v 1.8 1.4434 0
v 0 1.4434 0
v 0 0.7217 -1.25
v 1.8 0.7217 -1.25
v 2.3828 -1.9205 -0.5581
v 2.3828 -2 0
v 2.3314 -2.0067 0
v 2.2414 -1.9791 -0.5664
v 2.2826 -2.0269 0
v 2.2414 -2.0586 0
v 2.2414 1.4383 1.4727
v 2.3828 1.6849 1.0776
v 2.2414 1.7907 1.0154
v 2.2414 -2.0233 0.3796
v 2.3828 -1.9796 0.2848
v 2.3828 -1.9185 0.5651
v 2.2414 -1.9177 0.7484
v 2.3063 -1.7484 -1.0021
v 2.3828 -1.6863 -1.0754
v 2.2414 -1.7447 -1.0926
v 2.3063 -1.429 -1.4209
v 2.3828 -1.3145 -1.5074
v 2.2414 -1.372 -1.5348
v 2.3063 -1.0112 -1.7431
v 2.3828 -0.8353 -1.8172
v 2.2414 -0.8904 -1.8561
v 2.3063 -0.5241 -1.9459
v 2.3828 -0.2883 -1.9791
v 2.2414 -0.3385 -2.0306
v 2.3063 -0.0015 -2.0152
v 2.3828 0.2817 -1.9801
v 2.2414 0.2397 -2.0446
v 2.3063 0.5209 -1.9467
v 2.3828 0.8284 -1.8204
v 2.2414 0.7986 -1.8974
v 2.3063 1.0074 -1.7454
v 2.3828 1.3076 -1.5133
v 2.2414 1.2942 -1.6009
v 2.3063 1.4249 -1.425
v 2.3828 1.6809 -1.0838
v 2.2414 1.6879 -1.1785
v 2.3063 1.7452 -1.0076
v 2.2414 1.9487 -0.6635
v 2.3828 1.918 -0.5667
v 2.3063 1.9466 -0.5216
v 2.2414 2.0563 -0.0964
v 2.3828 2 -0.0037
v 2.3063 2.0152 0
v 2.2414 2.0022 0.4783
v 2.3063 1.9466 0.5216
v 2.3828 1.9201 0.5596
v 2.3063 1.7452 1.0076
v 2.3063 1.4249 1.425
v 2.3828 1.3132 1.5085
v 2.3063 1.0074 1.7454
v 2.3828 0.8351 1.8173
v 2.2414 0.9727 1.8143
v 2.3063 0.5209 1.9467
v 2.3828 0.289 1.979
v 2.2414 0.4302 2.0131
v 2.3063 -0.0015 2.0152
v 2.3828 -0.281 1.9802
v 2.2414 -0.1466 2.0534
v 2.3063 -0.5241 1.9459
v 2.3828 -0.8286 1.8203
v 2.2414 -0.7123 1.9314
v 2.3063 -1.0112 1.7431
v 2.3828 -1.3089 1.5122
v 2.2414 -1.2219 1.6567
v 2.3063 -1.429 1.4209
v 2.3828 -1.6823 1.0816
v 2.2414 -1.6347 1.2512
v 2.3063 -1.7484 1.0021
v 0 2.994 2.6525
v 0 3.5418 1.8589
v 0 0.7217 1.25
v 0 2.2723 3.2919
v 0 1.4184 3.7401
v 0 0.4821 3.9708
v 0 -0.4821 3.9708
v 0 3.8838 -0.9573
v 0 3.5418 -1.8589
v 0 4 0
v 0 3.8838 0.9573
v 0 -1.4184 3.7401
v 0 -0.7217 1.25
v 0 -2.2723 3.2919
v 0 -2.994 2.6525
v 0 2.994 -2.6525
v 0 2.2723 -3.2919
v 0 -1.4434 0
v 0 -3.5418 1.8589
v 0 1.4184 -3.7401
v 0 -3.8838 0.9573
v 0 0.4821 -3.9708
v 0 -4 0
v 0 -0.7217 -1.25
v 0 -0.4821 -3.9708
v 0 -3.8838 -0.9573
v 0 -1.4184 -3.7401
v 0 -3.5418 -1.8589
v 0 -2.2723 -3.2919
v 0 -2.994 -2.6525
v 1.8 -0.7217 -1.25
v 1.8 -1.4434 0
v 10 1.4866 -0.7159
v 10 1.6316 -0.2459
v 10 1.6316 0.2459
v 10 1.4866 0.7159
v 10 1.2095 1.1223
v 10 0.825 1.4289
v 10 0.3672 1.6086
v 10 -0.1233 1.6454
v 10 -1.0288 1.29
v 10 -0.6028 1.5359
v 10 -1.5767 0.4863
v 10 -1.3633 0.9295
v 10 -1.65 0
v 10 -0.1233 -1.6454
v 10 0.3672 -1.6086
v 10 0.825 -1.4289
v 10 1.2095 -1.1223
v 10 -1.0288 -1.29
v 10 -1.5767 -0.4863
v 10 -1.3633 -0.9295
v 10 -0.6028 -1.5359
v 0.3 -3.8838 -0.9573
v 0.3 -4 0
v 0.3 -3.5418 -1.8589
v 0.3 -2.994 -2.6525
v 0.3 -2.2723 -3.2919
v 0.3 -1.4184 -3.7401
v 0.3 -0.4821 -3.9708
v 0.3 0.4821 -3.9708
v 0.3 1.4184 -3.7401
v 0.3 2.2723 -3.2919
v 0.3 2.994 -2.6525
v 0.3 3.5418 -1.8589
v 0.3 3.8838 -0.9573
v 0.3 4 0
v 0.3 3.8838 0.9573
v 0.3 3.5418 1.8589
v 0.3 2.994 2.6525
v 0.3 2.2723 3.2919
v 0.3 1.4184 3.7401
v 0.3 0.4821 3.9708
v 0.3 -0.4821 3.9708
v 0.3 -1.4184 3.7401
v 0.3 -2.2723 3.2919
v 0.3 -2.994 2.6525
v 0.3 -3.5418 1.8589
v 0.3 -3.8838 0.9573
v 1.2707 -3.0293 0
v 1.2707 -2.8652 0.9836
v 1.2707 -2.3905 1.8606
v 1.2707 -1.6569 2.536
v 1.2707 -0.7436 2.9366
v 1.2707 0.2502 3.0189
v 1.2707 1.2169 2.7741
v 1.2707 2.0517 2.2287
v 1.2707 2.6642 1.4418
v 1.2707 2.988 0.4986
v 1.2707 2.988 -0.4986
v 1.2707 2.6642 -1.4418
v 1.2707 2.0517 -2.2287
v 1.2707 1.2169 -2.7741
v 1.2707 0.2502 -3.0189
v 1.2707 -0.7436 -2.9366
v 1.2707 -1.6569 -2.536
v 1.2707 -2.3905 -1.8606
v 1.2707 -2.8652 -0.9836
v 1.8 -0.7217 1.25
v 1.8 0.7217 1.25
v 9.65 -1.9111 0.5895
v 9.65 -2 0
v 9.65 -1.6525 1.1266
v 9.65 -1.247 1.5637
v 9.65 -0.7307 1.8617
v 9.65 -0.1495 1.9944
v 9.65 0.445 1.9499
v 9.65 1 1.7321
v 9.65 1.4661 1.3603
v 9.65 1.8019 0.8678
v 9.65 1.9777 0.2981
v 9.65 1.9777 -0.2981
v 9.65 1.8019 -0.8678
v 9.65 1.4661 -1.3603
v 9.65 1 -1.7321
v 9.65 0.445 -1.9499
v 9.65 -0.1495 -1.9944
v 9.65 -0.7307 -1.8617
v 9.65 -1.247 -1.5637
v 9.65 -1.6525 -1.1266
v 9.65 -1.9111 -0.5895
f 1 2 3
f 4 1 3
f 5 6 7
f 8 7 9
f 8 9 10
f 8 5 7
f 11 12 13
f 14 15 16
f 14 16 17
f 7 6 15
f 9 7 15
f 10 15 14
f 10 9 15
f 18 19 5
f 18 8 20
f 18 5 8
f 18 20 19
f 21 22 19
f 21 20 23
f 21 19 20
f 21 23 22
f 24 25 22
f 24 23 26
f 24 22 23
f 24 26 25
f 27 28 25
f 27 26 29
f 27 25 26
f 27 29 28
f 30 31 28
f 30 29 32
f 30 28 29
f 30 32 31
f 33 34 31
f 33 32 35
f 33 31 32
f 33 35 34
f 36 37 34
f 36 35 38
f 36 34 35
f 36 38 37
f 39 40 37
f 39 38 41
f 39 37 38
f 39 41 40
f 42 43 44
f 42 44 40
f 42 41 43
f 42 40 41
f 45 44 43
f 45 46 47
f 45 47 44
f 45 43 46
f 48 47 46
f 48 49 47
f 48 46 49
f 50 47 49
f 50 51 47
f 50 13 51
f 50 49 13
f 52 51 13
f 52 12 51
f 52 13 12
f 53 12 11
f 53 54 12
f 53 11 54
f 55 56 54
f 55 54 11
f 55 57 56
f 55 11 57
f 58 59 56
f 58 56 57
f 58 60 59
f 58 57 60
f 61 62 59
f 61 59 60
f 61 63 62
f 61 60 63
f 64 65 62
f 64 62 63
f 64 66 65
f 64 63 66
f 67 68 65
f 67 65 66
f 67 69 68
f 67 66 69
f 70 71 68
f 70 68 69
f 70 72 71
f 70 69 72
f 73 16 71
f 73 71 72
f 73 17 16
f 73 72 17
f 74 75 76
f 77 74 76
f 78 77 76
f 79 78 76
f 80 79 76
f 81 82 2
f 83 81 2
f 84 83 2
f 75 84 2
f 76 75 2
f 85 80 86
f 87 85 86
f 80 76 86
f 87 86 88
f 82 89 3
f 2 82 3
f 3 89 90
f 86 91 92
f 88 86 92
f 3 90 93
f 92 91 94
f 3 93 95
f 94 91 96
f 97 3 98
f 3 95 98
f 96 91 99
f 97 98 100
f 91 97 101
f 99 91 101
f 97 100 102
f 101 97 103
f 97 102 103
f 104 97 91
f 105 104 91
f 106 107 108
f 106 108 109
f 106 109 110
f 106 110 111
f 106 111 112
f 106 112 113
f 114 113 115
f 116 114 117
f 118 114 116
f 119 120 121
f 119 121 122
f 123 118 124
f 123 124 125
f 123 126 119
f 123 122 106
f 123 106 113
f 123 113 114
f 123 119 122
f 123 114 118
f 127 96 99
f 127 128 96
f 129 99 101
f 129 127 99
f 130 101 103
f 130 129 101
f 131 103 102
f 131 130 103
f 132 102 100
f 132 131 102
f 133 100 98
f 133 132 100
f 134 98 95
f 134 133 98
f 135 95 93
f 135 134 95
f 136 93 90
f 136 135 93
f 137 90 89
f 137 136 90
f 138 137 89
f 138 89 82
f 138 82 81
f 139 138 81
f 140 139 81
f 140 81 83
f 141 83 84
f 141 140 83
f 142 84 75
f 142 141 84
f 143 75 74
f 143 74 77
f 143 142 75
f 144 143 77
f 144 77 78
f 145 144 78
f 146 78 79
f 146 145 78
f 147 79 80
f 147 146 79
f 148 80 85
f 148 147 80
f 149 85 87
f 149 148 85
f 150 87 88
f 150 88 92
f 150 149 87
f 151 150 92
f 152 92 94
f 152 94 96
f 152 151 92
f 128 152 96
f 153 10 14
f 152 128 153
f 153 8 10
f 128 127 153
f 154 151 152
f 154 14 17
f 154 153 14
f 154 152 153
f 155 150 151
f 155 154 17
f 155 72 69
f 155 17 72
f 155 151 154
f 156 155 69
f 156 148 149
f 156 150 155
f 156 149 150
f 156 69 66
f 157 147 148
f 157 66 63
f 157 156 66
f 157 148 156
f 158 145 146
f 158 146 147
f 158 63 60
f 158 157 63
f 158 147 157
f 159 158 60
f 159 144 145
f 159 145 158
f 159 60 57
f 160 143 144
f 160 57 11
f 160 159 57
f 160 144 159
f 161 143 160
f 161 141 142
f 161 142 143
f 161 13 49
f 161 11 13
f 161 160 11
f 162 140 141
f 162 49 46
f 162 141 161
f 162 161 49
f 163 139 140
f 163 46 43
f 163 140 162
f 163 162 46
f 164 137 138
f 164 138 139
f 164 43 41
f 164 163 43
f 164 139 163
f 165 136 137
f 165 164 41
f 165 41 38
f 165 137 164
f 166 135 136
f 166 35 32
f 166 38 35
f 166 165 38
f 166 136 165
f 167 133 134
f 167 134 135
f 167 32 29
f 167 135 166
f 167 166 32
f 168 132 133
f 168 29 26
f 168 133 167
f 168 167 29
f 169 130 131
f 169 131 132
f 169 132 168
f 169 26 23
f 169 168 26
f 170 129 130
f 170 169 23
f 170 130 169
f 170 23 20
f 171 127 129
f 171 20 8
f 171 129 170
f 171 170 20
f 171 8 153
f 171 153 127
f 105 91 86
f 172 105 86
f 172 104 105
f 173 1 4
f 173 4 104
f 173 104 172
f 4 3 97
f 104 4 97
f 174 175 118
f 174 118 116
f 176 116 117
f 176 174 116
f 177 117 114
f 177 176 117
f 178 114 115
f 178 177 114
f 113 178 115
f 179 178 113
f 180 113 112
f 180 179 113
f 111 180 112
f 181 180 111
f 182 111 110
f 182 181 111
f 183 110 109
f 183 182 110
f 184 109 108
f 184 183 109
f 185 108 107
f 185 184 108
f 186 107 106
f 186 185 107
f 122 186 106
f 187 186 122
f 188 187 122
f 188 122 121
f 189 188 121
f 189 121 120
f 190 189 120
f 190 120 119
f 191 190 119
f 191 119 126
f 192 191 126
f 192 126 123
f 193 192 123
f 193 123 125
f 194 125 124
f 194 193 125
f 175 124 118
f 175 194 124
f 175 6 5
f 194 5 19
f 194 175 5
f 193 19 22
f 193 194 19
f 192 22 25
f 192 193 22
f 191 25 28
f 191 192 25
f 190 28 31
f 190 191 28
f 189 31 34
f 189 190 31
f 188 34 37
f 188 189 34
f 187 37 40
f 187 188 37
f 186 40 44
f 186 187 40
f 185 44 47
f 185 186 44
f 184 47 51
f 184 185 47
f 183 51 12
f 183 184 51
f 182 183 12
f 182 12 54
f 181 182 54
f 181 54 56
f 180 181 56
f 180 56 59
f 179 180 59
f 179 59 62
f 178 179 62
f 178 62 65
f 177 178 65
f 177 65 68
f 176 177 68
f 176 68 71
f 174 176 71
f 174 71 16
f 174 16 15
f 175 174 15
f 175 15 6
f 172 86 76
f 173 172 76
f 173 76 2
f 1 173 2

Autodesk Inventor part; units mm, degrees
ref_plane "YZ Plane" through (0, 0, 0) normal (1, 0, 0) x (0, 1, 0)
sketch "Skizze1" plane through (0, 0, 0) normal (0, 1, 0) x (-1, 0, 0)
  point P0 (0, 0)
sketch "Skizze2" plane through (0, 0, 0) normal (0, 0, 1) x (-1, 0, 0)
  line L0 (-10, 2) -> (-10, 0)
  line L1 (-2.3, 2) -> (-10, 2)
  line L2 (-0.3, 4) -> (-2.3, 2)
  line L3 (0, 4) -> (-0.3, 4)
  line L4 (0, 0) -> (0, 4)
  line L5 (-10, 0) -> (0, 0)
  line L6 (-10, 0) -> (0, 0)
  line L7 (0, -9.6) -> (0, 1.6) projected
  line L8 (2, 0) -> (-12, 0) projected
  dimension "ParC" = 0.3
  dimension "d43" = 45
  dimension "d44" = 4
  dimension "d45" = 2
  dimension "d46" = 10
  dimension "d47" = 0
  dimension "d48" = 0
revolve "Drehung1" add sketch "Skizze2" angle 360 about axis through (10, 0, 0) along (1, 0, 0)
sketch "Skizze3" plane through (0, 0, 0) normal (-1, 0, 0) x (0, 0, 1)
  line L0 (-1.25, 0.7217) -> (-1.25, -0.7217)
  line L1 (0, 1.4434) -> (-1.25, 0.7217)
  line L2 (1.25, 0.7217) -> (0, 1.4434)
  line L3 (1.25, -0.7217) -> (1.25, 0.7217)
  line L4 (0, -1.4434) -> (1.25, -0.7217)
  line L5 (-1.25, -0.7217) -> (0, -1.4434)
  circle A0 centre (0, 0) radius 1.25 construction
  circle A1 centre (0, 0) radius 2 construction
  dimension "d11" = 2.5
  dimension "d13" = 120
  dimension "d15" = 120
extrude "Extrusion1" cut sketch "Skizze3" against normal blind 1.8
fillet "Rundung1" radius 0.2 1 edges at (2.3, 2, 0)
chamfer "Fase1" distance 0.35 angle 45 1 edges at (10, 2, 0) measured on face at (7.4609, 0.9288, -1.7713)
thread "Gewinde1" size "M4x0.7" class "6g" standard "ISO Metric profile" length 6.3
ref_plane "MSC_PF1" through (0, 0, 0) normal (1, 0, 0) x (0, 1, 0)
ref_plane "MSC_PT1" through (0, 0, 0) normal (1, 0, 0) x (0, 1, 0)
equation "\"d43\" = 0.5 * ang"
equation "\"d44\" = 0.5 * dk"
equation "\"d45\" = 0.5 * NND"
equation "\"d46\" = NLG"
equation "\"d11\" = ParS"
equation "\"d16\" = ParT"
equation "\"d18\" = r"
equation "\"d19\" = 0.5 * PTC"
equation "\"d39\" = 0.5 * PTC"
equation "\"NND\" = 4"
equation "\"PTC\" = 0.7"
equation "\"dk\" = 8"
equation "\"ParK\" = 2.3"
equation "\"ParS\" = 2.5"
equation "\"ParT\" = 1.8"
equation "\"r\" = 0.2"
equation "\"NLG\" = 10"
equation "\"ang\" = 90deg"
equation "\"THREADDIA\" = NND"
properties part number "ISO 10642 - M4 x  10" material "Stahl"
